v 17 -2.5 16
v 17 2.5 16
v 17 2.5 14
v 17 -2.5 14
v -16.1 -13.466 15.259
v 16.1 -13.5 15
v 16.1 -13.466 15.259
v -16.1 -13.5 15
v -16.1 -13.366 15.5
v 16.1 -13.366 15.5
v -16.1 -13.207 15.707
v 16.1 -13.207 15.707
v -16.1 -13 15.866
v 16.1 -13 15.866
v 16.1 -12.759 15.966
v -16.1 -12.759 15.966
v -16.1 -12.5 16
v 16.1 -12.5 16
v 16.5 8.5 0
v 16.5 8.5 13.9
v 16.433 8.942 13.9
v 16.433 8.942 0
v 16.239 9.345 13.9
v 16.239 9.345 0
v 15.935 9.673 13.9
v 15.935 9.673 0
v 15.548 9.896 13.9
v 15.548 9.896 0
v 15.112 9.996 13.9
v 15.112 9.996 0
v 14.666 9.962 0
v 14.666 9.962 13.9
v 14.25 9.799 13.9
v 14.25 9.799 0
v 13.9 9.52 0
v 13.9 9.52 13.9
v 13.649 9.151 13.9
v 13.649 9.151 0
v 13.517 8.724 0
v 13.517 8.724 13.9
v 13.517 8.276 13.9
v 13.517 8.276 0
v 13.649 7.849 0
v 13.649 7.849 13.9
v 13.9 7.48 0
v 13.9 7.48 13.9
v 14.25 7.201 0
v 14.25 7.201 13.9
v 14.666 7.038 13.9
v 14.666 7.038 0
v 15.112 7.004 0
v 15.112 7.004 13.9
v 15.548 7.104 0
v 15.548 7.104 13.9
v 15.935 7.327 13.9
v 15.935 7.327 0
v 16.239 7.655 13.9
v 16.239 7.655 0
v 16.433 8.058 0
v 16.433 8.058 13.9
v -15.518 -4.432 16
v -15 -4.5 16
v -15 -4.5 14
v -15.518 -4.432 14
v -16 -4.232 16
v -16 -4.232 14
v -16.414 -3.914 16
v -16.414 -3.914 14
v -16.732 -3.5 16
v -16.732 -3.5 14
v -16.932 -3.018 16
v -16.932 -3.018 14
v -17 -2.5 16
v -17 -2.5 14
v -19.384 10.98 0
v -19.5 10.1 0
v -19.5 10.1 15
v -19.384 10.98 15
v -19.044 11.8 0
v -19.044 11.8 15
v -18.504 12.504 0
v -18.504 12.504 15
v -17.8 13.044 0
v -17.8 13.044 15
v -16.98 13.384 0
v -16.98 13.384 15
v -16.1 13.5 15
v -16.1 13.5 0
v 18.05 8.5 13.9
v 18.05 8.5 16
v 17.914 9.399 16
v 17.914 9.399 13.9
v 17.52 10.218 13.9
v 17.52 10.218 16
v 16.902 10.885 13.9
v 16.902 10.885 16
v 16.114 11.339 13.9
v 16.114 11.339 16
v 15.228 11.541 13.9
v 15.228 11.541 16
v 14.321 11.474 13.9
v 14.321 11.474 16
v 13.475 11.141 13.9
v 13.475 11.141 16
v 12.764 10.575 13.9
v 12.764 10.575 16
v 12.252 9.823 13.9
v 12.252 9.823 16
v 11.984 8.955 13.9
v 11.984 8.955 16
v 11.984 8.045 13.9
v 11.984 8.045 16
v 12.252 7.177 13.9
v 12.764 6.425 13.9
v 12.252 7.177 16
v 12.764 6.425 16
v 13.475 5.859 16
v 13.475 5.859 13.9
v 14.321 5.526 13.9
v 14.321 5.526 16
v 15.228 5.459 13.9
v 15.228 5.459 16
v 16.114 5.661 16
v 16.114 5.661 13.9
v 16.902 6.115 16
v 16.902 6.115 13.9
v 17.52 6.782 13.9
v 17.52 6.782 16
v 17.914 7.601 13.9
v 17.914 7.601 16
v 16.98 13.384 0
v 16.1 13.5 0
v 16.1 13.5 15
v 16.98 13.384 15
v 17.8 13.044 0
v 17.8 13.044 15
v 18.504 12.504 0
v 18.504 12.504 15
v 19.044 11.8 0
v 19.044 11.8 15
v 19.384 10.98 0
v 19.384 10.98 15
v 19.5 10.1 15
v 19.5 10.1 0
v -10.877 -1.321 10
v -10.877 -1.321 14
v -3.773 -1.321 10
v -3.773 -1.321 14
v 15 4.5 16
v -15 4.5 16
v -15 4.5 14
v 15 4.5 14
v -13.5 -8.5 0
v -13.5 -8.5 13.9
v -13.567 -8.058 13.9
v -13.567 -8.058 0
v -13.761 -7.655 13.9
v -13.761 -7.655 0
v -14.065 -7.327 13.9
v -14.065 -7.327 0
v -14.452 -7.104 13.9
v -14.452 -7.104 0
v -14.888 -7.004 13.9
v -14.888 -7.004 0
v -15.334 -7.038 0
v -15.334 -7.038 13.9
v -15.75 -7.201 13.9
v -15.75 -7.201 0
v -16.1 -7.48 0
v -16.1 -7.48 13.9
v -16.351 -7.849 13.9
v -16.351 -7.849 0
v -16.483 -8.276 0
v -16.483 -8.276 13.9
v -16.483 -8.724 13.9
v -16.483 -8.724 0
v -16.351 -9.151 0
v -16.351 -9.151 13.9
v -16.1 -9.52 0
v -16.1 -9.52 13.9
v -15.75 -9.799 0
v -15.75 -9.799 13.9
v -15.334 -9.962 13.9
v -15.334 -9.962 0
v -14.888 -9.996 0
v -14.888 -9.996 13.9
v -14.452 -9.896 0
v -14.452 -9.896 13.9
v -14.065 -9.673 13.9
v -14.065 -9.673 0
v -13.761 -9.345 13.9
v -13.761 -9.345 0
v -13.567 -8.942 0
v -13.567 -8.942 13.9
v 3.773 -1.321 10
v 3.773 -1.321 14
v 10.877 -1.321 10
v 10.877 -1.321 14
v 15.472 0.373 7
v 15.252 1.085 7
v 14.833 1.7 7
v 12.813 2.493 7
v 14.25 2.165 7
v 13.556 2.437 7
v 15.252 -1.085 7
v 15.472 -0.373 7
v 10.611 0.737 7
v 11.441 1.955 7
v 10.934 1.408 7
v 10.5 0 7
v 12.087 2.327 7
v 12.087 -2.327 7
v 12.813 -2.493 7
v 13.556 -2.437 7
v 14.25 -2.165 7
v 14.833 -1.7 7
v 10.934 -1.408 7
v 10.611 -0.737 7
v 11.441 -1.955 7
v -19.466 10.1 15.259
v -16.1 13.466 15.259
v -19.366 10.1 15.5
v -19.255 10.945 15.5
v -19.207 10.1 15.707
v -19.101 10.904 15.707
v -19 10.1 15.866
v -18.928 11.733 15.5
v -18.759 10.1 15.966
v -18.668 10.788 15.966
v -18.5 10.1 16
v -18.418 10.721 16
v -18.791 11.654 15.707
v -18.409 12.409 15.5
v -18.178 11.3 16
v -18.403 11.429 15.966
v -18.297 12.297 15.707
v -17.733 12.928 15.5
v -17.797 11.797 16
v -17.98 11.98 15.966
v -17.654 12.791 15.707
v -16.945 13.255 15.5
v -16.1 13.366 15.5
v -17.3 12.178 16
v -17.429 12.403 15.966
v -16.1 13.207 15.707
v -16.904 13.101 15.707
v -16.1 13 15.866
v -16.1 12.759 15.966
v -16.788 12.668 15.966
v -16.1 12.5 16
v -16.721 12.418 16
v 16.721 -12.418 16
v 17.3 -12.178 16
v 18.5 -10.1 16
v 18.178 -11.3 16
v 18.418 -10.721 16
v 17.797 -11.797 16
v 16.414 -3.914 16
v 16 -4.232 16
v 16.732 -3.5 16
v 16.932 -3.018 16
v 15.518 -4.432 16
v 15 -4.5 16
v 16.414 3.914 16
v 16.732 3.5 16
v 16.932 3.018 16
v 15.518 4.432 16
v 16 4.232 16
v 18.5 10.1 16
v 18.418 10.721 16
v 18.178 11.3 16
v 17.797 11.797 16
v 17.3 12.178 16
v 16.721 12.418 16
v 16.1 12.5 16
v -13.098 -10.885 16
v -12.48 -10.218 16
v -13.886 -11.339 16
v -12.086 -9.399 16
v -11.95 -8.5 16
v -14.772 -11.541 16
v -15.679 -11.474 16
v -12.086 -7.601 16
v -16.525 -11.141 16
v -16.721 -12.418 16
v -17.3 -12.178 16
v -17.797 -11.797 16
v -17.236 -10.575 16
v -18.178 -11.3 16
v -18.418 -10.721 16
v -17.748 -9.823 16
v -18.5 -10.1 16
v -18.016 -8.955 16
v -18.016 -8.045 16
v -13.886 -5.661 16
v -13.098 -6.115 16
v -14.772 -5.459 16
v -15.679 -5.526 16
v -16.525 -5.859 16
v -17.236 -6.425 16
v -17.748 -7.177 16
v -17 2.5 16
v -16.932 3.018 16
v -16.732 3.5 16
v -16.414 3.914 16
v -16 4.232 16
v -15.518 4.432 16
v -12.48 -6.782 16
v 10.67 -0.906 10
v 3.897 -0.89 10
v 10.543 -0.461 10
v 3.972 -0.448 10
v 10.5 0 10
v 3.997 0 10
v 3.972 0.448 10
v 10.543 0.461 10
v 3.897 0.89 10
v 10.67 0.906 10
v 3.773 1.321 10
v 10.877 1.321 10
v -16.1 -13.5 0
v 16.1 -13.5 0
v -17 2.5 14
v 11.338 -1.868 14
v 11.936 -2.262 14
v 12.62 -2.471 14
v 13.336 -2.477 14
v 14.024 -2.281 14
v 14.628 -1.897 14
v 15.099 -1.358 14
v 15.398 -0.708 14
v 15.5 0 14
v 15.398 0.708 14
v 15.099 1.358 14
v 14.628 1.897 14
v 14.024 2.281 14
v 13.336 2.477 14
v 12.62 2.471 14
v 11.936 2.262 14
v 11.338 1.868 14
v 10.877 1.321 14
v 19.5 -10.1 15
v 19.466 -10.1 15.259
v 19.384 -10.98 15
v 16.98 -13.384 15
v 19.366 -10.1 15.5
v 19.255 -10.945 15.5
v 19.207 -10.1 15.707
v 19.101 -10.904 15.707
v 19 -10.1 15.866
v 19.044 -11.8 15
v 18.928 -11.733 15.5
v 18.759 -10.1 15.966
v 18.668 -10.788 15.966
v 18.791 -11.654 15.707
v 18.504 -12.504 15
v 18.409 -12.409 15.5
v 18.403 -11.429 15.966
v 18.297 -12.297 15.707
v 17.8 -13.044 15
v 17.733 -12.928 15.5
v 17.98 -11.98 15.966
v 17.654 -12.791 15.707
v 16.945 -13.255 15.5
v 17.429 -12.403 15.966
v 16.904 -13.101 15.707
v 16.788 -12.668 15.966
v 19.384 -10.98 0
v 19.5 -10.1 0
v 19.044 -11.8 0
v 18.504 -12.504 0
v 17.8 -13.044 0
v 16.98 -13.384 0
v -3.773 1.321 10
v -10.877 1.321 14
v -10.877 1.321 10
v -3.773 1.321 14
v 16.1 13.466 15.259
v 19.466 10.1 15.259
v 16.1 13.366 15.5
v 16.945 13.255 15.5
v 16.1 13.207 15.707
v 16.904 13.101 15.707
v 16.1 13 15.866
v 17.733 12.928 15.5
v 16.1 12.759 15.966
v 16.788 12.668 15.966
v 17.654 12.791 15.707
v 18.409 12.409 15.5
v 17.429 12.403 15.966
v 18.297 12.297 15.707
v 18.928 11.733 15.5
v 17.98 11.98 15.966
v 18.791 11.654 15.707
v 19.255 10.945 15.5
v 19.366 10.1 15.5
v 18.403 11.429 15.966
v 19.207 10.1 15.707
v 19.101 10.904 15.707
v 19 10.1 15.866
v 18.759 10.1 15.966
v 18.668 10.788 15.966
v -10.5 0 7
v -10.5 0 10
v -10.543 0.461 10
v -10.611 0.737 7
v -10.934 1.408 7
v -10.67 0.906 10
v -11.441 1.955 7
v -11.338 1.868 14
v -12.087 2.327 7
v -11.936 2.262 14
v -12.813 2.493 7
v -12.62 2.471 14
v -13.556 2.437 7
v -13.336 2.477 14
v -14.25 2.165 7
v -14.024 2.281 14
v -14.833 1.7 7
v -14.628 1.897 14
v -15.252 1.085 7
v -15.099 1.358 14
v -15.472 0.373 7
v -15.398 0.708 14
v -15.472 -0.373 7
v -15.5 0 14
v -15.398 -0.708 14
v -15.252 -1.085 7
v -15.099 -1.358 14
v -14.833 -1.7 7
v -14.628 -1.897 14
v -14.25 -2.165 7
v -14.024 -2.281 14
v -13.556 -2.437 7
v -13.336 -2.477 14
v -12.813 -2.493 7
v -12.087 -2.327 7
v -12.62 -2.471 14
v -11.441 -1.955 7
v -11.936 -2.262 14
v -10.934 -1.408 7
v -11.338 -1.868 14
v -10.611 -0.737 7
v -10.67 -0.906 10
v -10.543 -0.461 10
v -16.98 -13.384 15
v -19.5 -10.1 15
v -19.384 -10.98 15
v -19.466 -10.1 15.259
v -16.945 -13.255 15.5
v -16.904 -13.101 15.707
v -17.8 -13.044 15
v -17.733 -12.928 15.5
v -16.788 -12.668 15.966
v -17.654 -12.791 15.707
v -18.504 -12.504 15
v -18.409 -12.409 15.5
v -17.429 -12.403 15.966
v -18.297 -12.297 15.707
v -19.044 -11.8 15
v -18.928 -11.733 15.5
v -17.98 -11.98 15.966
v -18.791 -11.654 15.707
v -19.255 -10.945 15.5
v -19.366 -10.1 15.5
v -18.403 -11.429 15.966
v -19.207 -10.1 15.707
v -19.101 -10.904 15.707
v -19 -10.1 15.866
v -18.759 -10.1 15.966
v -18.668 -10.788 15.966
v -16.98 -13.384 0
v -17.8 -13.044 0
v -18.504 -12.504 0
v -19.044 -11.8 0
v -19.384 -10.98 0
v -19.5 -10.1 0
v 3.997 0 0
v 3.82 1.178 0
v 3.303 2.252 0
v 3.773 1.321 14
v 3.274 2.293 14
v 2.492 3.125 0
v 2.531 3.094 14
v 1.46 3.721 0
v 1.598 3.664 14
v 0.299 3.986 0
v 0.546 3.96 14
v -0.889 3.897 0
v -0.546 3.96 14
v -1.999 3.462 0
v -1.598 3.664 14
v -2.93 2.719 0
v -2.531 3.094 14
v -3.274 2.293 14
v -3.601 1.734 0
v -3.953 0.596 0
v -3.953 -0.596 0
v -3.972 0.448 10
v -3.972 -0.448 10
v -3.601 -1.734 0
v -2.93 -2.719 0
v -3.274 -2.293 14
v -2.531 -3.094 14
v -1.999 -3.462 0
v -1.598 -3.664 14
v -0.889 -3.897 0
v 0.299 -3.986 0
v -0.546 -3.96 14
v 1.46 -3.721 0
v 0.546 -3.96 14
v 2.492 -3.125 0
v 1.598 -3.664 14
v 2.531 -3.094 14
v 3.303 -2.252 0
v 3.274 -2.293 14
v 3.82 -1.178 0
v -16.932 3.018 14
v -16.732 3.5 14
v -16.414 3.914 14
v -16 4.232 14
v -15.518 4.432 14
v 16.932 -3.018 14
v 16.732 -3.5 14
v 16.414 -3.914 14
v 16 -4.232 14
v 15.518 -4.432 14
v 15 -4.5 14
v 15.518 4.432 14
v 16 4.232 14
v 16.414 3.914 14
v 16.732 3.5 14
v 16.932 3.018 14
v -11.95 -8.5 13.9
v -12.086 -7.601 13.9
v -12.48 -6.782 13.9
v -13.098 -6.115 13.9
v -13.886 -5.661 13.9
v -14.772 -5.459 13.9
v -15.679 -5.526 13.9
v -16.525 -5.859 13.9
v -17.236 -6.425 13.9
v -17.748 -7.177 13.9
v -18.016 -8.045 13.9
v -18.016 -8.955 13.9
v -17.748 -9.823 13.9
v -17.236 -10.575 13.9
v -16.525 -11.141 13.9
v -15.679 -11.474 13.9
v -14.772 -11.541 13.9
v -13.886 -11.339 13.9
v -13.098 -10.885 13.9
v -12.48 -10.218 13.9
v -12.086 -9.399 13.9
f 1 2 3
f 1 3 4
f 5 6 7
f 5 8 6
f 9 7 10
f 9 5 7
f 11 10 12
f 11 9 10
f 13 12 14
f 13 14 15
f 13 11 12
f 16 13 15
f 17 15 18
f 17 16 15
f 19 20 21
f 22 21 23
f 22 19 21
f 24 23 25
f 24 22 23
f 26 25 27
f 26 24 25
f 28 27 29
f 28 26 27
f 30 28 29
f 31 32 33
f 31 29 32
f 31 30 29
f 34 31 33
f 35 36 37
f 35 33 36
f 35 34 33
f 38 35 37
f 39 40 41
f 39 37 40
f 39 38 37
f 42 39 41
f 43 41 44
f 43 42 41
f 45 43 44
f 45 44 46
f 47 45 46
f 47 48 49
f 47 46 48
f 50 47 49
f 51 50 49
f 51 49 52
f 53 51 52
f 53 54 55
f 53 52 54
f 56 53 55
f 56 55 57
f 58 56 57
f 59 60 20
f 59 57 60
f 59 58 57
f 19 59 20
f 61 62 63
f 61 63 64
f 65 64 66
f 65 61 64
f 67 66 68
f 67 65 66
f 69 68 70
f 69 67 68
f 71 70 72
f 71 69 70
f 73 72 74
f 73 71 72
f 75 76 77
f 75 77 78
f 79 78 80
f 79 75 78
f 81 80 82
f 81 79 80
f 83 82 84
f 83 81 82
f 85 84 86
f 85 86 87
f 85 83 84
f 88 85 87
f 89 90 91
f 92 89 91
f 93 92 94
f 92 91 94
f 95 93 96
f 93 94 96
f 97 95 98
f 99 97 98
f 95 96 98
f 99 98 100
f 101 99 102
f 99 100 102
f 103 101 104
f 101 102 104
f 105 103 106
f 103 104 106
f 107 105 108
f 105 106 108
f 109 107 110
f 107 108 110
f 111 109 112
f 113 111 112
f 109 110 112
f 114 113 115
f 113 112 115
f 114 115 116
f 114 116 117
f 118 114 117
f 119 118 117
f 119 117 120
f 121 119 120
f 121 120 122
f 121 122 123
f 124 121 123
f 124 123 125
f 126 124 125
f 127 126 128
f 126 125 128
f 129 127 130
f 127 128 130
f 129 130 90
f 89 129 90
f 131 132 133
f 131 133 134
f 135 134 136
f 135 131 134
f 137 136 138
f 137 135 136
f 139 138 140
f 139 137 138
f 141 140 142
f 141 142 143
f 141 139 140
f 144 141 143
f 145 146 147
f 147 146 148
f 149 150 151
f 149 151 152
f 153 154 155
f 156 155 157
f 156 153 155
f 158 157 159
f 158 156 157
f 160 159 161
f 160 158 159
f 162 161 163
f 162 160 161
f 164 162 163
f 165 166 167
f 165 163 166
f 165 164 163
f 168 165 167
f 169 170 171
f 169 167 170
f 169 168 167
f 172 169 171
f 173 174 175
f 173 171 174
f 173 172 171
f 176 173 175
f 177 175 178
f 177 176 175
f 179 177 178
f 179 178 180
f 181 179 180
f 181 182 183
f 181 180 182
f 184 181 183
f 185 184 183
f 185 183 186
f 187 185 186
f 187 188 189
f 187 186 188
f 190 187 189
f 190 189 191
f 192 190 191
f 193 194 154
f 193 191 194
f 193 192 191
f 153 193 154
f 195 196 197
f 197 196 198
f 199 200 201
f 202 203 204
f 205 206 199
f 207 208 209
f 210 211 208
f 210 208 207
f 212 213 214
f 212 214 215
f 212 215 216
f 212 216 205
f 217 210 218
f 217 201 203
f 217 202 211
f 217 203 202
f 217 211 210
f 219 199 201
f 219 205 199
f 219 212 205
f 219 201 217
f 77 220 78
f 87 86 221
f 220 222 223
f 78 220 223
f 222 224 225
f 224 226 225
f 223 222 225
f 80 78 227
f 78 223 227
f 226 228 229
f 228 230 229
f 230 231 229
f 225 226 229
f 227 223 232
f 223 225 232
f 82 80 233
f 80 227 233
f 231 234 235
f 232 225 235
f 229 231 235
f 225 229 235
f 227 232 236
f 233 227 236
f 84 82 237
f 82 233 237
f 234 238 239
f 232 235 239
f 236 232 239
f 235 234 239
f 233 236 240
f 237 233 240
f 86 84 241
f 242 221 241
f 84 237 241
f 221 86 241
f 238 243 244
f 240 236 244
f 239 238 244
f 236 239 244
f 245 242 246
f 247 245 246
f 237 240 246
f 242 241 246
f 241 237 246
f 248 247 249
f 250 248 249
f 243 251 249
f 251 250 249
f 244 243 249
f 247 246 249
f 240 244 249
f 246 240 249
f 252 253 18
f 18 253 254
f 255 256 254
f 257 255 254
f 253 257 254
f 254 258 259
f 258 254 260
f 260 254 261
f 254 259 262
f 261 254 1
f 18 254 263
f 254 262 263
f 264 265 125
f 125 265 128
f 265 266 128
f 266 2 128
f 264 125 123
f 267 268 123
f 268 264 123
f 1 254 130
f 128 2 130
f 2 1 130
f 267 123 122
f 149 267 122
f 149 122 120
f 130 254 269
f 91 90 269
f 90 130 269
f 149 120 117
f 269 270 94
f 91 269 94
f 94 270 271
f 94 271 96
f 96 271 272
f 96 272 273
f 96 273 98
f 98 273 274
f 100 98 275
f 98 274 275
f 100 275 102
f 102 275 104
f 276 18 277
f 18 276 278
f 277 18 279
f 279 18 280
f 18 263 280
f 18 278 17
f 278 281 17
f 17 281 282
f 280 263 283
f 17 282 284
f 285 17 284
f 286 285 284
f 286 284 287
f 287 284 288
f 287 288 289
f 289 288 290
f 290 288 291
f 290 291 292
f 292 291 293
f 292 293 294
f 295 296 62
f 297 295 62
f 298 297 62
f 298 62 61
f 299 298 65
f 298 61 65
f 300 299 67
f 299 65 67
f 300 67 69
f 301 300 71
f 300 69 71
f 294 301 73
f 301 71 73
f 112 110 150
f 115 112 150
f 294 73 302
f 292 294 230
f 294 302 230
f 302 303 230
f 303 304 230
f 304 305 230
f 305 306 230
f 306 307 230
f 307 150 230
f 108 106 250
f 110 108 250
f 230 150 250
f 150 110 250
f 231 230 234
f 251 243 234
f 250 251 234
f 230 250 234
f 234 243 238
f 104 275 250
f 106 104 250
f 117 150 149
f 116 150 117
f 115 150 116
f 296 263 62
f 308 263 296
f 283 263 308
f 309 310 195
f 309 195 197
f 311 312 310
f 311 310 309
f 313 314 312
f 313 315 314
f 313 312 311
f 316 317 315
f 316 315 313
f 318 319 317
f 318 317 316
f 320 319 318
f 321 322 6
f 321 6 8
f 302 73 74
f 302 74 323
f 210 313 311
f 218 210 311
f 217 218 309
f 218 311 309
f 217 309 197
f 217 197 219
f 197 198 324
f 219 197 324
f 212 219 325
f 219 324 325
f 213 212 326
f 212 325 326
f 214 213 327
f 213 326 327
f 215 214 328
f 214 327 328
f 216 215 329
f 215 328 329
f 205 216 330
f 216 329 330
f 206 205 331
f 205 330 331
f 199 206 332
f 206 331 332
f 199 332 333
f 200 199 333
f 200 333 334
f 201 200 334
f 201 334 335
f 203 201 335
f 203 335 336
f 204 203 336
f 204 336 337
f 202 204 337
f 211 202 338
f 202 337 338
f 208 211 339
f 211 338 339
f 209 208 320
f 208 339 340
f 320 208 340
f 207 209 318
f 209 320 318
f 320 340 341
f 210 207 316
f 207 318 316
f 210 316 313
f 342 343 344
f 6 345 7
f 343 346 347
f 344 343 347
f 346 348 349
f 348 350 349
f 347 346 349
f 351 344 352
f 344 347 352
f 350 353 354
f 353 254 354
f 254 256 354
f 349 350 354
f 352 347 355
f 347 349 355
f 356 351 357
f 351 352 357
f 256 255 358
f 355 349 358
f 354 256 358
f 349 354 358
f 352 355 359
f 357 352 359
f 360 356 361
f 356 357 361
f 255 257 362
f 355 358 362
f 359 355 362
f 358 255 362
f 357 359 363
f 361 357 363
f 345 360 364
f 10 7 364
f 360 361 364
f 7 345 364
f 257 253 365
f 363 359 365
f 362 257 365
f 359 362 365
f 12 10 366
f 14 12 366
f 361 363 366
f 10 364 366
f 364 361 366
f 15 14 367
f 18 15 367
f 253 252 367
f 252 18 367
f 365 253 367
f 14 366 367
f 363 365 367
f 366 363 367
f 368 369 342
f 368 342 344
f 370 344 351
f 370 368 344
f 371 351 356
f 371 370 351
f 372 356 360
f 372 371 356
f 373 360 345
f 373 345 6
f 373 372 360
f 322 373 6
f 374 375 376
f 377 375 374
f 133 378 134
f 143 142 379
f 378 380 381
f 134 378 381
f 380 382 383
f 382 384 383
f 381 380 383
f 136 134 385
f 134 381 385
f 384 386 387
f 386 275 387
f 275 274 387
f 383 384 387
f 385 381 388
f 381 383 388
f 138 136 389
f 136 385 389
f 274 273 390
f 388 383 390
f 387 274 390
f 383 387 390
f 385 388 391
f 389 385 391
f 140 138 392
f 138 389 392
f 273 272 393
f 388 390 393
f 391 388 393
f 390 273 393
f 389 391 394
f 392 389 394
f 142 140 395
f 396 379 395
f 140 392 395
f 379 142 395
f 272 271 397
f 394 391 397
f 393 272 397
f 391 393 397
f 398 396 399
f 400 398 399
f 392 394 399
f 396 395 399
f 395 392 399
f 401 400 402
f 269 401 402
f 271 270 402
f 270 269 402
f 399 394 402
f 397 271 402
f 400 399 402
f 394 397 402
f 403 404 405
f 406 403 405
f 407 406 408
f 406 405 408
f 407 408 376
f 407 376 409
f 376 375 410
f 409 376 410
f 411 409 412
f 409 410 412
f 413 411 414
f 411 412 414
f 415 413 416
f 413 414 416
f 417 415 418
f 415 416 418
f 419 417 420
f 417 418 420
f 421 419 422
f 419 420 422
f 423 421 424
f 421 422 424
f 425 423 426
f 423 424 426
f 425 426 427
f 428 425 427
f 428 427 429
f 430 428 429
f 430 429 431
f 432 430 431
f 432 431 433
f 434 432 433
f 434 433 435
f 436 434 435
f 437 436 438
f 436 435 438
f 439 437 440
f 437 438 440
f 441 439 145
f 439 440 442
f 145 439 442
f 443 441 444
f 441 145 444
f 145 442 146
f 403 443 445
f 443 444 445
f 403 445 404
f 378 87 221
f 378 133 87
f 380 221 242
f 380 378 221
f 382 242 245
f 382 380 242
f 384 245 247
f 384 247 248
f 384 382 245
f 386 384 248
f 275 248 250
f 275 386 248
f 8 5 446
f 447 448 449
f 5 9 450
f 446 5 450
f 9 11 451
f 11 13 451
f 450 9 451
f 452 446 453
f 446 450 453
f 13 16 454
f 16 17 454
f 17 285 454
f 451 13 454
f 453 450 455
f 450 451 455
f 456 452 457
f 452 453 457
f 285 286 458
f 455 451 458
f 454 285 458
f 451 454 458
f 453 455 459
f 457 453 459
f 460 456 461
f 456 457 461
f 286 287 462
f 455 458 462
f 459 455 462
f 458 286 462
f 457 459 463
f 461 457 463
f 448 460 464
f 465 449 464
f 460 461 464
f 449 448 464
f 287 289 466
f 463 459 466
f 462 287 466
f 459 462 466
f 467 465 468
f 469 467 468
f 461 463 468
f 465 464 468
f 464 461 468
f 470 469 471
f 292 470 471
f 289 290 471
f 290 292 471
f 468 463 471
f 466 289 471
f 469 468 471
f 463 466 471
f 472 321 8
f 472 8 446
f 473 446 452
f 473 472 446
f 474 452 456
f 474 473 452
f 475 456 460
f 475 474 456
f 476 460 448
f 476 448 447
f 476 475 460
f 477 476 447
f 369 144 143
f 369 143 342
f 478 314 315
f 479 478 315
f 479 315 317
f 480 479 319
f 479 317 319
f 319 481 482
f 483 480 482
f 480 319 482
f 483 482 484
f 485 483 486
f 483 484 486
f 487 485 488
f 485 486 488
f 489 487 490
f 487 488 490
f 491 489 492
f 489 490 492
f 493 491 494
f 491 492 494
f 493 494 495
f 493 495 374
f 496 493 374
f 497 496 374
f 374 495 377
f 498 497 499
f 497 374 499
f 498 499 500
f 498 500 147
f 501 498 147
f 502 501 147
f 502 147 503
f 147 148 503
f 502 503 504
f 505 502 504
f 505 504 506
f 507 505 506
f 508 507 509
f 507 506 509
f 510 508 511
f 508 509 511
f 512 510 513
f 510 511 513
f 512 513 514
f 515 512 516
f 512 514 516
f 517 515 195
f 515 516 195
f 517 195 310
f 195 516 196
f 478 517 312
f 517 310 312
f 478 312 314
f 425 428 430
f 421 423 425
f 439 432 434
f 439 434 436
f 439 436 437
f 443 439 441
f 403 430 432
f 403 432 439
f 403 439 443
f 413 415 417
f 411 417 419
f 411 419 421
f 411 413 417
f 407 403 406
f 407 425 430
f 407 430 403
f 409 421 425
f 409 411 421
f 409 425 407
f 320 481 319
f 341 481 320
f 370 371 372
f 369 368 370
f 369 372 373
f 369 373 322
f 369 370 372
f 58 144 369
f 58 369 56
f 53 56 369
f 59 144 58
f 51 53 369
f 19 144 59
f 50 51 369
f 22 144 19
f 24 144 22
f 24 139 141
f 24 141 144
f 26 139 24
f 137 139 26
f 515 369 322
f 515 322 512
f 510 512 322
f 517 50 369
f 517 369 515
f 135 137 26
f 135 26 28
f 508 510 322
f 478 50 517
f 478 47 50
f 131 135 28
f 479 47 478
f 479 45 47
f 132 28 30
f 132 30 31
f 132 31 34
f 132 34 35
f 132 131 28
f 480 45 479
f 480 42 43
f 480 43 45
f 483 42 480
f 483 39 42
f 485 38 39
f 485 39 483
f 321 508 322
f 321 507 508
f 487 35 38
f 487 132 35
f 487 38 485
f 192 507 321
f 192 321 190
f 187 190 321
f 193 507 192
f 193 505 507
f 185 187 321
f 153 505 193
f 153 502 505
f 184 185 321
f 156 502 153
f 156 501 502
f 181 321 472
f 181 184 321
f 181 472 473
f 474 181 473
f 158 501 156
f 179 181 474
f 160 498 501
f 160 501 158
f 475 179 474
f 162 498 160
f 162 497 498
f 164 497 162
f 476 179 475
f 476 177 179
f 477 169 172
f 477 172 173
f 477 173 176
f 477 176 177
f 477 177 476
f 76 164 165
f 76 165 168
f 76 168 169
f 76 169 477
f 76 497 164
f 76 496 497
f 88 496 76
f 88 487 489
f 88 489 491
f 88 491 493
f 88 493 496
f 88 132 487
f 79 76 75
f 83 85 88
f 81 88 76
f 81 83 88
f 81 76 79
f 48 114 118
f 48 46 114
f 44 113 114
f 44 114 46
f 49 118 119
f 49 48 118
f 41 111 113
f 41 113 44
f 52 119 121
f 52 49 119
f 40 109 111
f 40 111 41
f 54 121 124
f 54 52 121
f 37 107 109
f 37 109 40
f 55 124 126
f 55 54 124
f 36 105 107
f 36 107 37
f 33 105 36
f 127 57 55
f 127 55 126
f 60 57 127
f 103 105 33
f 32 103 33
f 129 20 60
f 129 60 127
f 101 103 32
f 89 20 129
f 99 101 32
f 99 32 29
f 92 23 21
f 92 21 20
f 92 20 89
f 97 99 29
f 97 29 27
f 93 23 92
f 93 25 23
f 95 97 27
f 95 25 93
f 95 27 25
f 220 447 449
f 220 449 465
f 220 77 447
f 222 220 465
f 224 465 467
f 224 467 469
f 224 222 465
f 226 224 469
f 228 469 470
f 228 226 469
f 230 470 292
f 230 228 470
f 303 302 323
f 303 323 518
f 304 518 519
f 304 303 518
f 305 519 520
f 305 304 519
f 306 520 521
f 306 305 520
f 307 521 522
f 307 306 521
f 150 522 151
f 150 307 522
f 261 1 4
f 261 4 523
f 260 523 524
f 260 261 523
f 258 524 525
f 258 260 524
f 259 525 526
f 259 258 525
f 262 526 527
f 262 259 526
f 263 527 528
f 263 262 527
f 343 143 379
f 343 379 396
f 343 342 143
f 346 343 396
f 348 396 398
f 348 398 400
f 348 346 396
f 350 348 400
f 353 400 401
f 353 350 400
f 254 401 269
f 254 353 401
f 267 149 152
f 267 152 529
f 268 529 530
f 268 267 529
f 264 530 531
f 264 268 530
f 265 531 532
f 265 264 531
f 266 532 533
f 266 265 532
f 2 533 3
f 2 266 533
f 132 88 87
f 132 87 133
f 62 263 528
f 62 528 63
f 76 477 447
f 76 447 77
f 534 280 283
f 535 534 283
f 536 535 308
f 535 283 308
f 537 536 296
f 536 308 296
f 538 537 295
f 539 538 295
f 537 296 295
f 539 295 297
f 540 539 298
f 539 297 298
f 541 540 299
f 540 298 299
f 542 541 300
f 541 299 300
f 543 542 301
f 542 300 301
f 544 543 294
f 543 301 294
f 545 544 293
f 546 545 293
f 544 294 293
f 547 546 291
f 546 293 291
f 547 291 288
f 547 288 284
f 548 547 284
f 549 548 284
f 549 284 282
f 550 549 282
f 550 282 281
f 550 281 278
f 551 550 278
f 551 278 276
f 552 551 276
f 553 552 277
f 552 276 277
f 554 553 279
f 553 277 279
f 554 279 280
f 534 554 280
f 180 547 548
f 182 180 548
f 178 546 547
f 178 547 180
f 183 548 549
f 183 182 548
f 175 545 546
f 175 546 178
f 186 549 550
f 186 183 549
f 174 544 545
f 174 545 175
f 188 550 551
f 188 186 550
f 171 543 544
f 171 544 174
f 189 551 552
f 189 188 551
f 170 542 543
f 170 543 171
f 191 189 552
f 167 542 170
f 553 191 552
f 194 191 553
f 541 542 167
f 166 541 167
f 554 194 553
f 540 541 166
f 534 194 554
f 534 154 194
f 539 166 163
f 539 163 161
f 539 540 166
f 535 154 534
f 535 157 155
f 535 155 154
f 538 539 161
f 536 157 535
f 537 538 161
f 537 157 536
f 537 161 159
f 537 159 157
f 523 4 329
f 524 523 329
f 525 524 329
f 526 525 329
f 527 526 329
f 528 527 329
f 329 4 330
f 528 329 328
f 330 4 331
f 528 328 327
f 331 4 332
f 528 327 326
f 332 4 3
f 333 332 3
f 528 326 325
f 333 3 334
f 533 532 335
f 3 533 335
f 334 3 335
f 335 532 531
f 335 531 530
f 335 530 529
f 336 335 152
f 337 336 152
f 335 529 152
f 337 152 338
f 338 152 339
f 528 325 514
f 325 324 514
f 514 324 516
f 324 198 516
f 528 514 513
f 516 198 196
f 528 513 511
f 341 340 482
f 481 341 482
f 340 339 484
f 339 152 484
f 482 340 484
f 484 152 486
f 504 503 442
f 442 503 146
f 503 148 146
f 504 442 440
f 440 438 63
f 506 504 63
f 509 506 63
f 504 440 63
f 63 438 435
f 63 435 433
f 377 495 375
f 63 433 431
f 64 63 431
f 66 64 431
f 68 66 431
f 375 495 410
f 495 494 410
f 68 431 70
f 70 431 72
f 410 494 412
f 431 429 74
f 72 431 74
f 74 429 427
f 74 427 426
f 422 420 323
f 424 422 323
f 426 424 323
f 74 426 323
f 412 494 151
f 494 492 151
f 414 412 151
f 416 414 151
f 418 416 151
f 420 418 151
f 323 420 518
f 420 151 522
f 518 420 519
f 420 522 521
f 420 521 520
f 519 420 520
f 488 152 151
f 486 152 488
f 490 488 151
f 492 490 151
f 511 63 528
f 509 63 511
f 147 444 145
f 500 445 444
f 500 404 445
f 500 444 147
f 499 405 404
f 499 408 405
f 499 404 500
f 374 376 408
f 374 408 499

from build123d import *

# Parameters (mm, degrees)
SKIZZE1_R                       = 1.5
AUFSATZ_LINEAR_AUSTRAGEN1_DEPTH = 16
SCHNITT_LINEAR_AUSTRAGEN1_DEPTH = 2
SKIZZE3_R                       = 2.5
SCHNITT_LINEAR_AUSTRAGEN2_DEPTH = 7
SKIZZE4_R                       = 3.05
SCHNITT_LINEAR_AUSTRAGEN3_DEPTH = 2.1
VERRUNDUNG1_R                   = 1
SKIZZE5_R                       = 3.997213622
SCHNITT_LINEAR_AUSTRAGEN4_DEPTH = 28.540878708
SKIZZE6_W                       = 23.495930852
SKIZZE6_H                       = 2.64125978
SCHNITT_LINEAR_AUSTRAGEN5_DEPTH = 4


with BuildPart() as part:
    # Skizze1 → Aufsatz-Linear austragen1 (new body)
    with BuildSketch(Plane.XY):
        with BuildLine():
            Line((-16.1, 13.5), (16.1, 13.5))
            ThreePointArc((16.1, 13.5), (18.504163056, 12.504163056), (19.5, 10.1))
            Line((19.5, 10.1), (19.5, -10.1))
            ThreePointArc((19.5, -10.1), (18.504163056, -12.504163056), (16.1, -13.5))
            Line((16.1, -13.5), (-16.1, -13.5))
            ThreePointArc((-16.1, -13.5), (-18.504163056, -12.504163056), (-19.5, -10.1))
            Line((-19.5, -10.1), (-19.5, 10.1))
            ThreePointArc((-19.5, 10.1), (-18.504163056, 12.504163056), (-16.1, 13.5))
        make_face()
        with Locations((15, 8.5)):
            Circle(SKIZZE1_R, mode=Mode.SUBTRACT)
        with Locations((-15, -8.5)):
            Circle(SKIZZE1_R, mode=Mode.SUBTRACT)
    extrude(amount=AUFSATZ_LINEAR_AUSTRAGEN1_DEPTH)

    # Skizze2 → Schnitt-Linear austragen1 (cut)
    with BuildSketch(Plane.XY.offset(16)):
        with BuildLine():
            Line((-15, 4.5), (15, 4.5))
            ThreePointArc((15, 4.5), (16.414213562, 3.914213562), (17, 2.5))
            Line((17, 2.5), (17, -2.5))
            ThreePointArc((17, -2.5), (16.414213562, -3.914213562), (15, -4.5))
            Line((15, -4.5), (-15, -4.5))
            ThreePointArc((-15, -4.5), (-16.414213562, -3.914213562), (-17, -2.5))
            Line((-17, -2.5), (-17, 2.5))
            ThreePointArc((-17, 2.5), (-16.414213562, 3.914213562), (-15, 4.5))
        make_face()
    extrude(amount=-SCHNITT_LINEAR_AUSTRAGEN1_DEPTH, mode=Mode.SUBTRACT)

    # Skizze3 → Schnitt-Linear austragen2 (cut)
    with BuildSketch(Plane.XY.offset(14)):
        with Locations((-13, 0)):
            Circle(SKIZZE3_R)
        with Locations(Location((13, 0, 0), (0, 0, 180))):
            Circle(SKIZZE3_R)
    extrude(amount=-SCHNITT_LINEAR_AUSTRAGEN2_DEPTH, mode=Mode.SUBTRACT)

    # Skizze4 → Schnitt-Linear austragen3 (cut)
    with BuildSketch(Plane.XY.offset(16)):
        with Locations((15, 8.5)):
            Circle(SKIZZE4_R)
        with Locations((-15, -8.5)):
            Circle(SKIZZE4_R)
    extrude(amount=-SCHNITT_LINEAR_AUSTRAGEN3_DEPTH, mode=Mode.SUBTRACT)

    # Verrundung1
    verrundung1_edges = [part.edges().sort_by_distance(p)[0] for p in [
        (-18.504163056, 12.504163056, 16),
        (-19.5, 0, 16),
        (-18.504163056, -12.504163056, 16),
        (0, -13.5, 16),
        (18.504163056, -12.504163056, 16),
        (19.5, 0, 16),
        (18.504163056, 12.504163056, 16),
        (0, 13.5, 16),
    ]]
    fillet(verrundung1_edges, radius=VERRUNDUNG1_R)

    # Skizze5 → Schnitt-Linear austragen4 (cut, through all)
    with BuildSketch(Plane.XY.offset(14)):
        Circle(SKIZZE5_R)
    extrude(amount=-SCHNITT_LINEAR_AUSTRAGEN4_DEPTH, mode=Mode.SUBTRACT)

    # Skizze6 → Schnitt-Linear austragen5 (cut)
    with BuildSketch(Plane.XY.offset(14)):
        Rectangle(SKIZZE6_W, SKIZZE6_H)
    extrude(amount=-SCHNITT_LINEAR_AUSTRAGEN5_DEPTH, mode=Mode.SUBTRACT)


solid = part.part
